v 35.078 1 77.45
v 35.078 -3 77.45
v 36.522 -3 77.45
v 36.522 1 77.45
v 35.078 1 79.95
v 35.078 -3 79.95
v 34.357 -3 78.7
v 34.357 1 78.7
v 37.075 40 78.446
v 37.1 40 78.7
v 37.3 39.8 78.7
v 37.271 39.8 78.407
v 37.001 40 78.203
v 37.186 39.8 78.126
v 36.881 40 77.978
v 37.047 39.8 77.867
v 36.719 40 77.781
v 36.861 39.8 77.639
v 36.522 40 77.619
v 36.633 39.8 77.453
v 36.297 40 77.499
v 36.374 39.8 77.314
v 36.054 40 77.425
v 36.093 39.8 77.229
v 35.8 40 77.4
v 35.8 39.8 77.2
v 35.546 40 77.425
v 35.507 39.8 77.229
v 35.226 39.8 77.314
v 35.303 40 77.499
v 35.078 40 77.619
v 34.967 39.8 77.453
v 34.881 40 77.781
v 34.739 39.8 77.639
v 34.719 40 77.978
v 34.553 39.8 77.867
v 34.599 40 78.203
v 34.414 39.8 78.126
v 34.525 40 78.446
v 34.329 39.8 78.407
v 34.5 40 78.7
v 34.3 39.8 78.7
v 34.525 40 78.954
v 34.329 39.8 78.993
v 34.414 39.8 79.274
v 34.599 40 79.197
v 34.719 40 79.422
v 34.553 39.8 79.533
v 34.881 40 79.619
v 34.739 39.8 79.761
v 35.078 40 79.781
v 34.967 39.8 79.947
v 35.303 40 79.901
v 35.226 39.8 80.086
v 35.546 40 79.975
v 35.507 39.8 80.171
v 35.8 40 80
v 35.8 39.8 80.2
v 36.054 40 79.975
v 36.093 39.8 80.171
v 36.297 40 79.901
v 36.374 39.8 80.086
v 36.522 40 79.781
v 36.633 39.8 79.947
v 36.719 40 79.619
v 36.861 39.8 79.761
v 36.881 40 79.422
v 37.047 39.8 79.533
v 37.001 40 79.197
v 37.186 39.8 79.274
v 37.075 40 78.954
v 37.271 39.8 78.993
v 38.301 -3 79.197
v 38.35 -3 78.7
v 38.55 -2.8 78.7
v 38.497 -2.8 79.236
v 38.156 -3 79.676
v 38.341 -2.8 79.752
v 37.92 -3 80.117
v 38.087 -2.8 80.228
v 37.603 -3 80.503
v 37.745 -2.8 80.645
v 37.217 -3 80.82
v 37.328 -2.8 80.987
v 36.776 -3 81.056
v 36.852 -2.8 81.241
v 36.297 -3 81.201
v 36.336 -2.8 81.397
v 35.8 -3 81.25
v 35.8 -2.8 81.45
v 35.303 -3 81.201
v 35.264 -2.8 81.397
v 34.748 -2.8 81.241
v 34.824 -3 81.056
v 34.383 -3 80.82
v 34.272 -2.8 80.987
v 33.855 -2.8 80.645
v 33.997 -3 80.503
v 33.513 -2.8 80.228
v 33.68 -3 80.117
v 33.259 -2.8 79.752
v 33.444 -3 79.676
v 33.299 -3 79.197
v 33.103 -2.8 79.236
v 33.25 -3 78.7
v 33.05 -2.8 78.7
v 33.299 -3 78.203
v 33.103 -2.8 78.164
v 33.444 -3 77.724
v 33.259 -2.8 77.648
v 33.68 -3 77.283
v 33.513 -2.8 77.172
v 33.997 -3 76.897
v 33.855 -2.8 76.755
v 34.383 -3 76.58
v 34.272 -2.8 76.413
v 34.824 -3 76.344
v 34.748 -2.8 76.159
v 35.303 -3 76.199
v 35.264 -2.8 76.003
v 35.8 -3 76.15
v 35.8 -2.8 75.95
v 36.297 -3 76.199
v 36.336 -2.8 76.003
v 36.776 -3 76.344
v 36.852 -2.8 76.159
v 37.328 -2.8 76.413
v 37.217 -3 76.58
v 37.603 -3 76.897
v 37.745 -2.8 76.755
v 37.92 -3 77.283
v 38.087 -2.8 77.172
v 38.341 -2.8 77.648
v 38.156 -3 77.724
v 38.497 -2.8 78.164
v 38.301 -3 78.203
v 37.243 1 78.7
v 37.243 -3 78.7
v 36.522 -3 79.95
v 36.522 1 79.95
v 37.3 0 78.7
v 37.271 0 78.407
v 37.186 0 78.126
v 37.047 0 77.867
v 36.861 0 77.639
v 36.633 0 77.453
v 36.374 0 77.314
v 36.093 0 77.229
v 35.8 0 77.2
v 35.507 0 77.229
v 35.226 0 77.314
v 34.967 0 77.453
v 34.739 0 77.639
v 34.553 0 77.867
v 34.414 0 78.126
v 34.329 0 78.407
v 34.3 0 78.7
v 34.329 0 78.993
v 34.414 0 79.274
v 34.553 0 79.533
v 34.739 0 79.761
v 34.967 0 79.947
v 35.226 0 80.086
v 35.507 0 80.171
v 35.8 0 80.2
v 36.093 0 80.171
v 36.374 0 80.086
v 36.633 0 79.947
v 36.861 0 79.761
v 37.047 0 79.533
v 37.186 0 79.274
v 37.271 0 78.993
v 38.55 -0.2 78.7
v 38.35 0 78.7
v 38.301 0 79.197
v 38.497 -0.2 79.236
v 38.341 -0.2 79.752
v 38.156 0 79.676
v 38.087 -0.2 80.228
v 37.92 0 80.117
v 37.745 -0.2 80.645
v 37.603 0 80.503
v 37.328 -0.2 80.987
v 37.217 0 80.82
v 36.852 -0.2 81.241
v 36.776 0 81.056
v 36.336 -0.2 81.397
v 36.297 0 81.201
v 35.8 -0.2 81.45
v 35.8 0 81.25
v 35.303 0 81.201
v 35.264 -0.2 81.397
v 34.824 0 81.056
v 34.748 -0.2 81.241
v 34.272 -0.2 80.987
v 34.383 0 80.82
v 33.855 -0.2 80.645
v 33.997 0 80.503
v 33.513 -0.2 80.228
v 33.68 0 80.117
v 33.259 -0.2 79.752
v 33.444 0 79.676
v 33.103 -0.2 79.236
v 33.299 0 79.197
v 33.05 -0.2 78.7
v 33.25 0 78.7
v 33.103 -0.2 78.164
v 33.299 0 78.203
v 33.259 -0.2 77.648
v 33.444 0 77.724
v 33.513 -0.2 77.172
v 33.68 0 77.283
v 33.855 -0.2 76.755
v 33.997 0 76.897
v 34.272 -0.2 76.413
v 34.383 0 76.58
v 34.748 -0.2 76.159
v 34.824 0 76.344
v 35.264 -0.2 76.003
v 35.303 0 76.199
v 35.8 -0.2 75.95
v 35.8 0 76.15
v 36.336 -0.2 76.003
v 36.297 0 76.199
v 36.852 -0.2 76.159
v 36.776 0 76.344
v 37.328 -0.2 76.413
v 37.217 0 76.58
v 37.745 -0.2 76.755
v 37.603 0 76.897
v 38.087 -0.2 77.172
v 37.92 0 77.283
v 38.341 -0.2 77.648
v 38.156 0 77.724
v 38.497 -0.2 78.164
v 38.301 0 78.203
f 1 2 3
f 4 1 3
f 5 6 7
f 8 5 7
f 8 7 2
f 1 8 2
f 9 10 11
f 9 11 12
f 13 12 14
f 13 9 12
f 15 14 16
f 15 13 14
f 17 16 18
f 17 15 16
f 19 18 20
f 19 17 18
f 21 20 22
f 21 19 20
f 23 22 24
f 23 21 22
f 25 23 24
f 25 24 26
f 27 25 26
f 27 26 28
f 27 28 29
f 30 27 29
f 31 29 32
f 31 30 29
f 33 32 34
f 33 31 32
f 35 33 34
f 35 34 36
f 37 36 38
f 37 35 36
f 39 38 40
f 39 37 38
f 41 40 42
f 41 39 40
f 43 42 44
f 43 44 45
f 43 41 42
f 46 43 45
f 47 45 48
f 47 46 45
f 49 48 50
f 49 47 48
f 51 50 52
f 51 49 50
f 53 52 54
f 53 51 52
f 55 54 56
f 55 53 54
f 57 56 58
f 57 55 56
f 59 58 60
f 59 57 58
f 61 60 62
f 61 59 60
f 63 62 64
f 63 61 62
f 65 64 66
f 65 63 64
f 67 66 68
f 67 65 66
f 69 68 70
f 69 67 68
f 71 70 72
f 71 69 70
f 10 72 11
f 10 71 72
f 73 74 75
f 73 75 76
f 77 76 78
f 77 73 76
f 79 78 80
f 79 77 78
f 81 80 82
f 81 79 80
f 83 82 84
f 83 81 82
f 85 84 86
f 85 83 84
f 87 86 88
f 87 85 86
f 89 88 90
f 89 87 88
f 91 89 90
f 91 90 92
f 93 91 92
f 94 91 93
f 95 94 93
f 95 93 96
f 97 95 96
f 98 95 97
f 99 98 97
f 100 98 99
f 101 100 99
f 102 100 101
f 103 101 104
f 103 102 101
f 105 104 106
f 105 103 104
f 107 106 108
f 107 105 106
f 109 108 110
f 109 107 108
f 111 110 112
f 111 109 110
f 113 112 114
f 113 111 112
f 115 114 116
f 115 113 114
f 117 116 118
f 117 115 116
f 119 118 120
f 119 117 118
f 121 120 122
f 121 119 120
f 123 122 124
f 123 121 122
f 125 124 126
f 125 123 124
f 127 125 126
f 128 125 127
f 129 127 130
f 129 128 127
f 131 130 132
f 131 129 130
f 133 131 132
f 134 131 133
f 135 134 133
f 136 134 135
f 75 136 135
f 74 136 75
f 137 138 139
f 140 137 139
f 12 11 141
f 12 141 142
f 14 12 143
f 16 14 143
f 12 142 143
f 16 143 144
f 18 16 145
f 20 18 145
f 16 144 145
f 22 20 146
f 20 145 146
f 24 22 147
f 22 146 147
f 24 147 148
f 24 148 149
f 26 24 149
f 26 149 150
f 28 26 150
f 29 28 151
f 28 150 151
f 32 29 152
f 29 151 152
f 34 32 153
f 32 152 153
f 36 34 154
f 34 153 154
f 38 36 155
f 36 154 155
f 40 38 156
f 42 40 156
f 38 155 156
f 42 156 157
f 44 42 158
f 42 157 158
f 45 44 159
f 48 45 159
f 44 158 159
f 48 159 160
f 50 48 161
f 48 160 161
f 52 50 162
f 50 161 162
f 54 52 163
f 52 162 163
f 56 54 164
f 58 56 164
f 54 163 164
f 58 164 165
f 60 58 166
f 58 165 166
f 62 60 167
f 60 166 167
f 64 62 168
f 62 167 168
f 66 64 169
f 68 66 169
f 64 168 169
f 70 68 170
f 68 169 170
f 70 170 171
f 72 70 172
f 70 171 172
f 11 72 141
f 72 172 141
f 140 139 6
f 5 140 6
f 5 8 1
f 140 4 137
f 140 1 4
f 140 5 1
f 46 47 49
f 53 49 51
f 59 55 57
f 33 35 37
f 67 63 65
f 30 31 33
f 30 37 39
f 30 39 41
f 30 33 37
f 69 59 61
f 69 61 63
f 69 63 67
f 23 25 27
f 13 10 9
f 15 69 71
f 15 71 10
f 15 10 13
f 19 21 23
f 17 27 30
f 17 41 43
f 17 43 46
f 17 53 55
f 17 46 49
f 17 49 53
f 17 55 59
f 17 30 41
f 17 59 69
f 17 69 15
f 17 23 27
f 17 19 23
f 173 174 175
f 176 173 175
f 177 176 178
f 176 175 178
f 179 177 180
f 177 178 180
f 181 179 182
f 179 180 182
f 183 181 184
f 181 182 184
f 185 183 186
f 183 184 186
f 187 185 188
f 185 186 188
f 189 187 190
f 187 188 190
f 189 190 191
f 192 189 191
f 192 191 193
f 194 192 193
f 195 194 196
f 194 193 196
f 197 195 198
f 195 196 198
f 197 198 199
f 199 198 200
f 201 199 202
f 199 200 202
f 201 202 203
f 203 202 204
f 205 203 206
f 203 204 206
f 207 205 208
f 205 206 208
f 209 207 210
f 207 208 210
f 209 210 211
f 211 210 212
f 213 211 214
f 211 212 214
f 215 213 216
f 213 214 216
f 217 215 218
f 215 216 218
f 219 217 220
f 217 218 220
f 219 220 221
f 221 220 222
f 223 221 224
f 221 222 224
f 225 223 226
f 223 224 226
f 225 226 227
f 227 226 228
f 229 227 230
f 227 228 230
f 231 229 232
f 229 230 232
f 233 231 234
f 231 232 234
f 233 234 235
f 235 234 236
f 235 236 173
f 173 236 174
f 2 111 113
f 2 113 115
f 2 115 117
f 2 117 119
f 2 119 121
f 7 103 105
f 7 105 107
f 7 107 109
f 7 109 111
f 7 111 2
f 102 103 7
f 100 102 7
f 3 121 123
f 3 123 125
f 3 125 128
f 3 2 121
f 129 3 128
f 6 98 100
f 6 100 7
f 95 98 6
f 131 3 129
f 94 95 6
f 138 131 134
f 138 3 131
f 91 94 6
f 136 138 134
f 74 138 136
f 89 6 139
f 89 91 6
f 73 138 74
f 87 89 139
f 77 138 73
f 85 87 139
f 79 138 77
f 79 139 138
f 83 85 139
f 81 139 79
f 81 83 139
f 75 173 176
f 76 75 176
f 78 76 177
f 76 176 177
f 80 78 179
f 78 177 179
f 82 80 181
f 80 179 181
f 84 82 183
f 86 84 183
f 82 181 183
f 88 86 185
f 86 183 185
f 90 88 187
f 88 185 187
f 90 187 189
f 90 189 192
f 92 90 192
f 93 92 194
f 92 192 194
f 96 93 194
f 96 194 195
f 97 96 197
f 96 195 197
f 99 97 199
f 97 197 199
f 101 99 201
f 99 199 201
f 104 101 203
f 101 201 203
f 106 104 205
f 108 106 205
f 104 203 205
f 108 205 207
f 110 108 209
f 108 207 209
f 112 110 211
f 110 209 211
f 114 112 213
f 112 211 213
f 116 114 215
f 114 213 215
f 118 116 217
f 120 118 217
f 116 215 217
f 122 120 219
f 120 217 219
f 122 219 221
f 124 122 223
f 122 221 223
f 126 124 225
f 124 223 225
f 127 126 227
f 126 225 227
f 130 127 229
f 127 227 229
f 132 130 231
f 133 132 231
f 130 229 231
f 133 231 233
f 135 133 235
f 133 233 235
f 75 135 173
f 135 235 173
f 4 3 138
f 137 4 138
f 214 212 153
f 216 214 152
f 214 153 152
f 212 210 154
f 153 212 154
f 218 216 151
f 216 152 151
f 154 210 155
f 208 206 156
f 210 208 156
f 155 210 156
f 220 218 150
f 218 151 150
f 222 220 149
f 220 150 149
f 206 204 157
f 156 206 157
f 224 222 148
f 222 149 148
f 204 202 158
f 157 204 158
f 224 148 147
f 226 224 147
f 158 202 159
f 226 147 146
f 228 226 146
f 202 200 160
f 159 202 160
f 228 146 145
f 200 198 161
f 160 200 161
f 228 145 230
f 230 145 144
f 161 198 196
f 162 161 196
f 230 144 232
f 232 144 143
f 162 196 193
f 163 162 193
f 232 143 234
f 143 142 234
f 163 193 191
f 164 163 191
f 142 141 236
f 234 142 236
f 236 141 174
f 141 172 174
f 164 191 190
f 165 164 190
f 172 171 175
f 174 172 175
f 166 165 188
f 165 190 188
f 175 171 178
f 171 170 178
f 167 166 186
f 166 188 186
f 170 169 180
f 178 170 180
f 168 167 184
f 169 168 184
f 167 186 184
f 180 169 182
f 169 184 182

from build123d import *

# Parameters (mm, degrees)
SKETCH006_R             = 2.75
PAD002_DEPTH            = 3
SKETCH007_R             = 1.5
PAD003_DEPTH            = 40
POCKET003_DEPTH         = 4
CHAMFER001_SIZE         = 0.2
BODY002_PLACEMENT_ANGLE = 90


with BuildPart() as part:
    # Sketch006 → Pad002 (new body)
    with BuildSketch(Plane.XY):
        Circle(SKETCH006_R)
    extrude(amount=PAD002_DEPTH)

    # Sketch007 (on Face2 of Pad002) → Pad003 (join)
    with BuildSketch(Plane(origin=(0, 0, 0), x_dir=(1, 0, 0), z_dir=(0, 0, -1))):
        Circle(SKETCH007_R)
    extrude(amount=PAD003_DEPTH)

    # Sketch008 (on DatumPlane) → Pocket003 (cut)
    with BuildSketch(Plane.XY.offset(3)):
        Polygon((0.7216878365, -1.25), (1.443375673, 0), (0.7216878365, 1.25), (-0.7216878365, 1.25), (-1.443375673, 0), (-0.7216878365, -1.25), align=None)
    extrude(amount=-POCKET003_DEPTH, mode=Mode.SUBTRACT)

    # Chamfer001
    chamfer001_edges = [part.edges().sort_by_distance(p)[0] for p in [
        (-1.5, 0, -40),
        (-2.75, 0, 0),
        (-2.75, 0, 3),
    ]]
    chamfer(chamfer001_edges, length=CHAMFER001_SIZE)


with BuildPart() as part_1:
    # Body002 placement: moved
    add(part.part.moved(Location((35.8, 0, 78.7))).rotate(Axis((35.8, 0, 78.7), (1, 0, 0)), BODY002_PLACEMENT_ANGLE))


solid = part_1.part
